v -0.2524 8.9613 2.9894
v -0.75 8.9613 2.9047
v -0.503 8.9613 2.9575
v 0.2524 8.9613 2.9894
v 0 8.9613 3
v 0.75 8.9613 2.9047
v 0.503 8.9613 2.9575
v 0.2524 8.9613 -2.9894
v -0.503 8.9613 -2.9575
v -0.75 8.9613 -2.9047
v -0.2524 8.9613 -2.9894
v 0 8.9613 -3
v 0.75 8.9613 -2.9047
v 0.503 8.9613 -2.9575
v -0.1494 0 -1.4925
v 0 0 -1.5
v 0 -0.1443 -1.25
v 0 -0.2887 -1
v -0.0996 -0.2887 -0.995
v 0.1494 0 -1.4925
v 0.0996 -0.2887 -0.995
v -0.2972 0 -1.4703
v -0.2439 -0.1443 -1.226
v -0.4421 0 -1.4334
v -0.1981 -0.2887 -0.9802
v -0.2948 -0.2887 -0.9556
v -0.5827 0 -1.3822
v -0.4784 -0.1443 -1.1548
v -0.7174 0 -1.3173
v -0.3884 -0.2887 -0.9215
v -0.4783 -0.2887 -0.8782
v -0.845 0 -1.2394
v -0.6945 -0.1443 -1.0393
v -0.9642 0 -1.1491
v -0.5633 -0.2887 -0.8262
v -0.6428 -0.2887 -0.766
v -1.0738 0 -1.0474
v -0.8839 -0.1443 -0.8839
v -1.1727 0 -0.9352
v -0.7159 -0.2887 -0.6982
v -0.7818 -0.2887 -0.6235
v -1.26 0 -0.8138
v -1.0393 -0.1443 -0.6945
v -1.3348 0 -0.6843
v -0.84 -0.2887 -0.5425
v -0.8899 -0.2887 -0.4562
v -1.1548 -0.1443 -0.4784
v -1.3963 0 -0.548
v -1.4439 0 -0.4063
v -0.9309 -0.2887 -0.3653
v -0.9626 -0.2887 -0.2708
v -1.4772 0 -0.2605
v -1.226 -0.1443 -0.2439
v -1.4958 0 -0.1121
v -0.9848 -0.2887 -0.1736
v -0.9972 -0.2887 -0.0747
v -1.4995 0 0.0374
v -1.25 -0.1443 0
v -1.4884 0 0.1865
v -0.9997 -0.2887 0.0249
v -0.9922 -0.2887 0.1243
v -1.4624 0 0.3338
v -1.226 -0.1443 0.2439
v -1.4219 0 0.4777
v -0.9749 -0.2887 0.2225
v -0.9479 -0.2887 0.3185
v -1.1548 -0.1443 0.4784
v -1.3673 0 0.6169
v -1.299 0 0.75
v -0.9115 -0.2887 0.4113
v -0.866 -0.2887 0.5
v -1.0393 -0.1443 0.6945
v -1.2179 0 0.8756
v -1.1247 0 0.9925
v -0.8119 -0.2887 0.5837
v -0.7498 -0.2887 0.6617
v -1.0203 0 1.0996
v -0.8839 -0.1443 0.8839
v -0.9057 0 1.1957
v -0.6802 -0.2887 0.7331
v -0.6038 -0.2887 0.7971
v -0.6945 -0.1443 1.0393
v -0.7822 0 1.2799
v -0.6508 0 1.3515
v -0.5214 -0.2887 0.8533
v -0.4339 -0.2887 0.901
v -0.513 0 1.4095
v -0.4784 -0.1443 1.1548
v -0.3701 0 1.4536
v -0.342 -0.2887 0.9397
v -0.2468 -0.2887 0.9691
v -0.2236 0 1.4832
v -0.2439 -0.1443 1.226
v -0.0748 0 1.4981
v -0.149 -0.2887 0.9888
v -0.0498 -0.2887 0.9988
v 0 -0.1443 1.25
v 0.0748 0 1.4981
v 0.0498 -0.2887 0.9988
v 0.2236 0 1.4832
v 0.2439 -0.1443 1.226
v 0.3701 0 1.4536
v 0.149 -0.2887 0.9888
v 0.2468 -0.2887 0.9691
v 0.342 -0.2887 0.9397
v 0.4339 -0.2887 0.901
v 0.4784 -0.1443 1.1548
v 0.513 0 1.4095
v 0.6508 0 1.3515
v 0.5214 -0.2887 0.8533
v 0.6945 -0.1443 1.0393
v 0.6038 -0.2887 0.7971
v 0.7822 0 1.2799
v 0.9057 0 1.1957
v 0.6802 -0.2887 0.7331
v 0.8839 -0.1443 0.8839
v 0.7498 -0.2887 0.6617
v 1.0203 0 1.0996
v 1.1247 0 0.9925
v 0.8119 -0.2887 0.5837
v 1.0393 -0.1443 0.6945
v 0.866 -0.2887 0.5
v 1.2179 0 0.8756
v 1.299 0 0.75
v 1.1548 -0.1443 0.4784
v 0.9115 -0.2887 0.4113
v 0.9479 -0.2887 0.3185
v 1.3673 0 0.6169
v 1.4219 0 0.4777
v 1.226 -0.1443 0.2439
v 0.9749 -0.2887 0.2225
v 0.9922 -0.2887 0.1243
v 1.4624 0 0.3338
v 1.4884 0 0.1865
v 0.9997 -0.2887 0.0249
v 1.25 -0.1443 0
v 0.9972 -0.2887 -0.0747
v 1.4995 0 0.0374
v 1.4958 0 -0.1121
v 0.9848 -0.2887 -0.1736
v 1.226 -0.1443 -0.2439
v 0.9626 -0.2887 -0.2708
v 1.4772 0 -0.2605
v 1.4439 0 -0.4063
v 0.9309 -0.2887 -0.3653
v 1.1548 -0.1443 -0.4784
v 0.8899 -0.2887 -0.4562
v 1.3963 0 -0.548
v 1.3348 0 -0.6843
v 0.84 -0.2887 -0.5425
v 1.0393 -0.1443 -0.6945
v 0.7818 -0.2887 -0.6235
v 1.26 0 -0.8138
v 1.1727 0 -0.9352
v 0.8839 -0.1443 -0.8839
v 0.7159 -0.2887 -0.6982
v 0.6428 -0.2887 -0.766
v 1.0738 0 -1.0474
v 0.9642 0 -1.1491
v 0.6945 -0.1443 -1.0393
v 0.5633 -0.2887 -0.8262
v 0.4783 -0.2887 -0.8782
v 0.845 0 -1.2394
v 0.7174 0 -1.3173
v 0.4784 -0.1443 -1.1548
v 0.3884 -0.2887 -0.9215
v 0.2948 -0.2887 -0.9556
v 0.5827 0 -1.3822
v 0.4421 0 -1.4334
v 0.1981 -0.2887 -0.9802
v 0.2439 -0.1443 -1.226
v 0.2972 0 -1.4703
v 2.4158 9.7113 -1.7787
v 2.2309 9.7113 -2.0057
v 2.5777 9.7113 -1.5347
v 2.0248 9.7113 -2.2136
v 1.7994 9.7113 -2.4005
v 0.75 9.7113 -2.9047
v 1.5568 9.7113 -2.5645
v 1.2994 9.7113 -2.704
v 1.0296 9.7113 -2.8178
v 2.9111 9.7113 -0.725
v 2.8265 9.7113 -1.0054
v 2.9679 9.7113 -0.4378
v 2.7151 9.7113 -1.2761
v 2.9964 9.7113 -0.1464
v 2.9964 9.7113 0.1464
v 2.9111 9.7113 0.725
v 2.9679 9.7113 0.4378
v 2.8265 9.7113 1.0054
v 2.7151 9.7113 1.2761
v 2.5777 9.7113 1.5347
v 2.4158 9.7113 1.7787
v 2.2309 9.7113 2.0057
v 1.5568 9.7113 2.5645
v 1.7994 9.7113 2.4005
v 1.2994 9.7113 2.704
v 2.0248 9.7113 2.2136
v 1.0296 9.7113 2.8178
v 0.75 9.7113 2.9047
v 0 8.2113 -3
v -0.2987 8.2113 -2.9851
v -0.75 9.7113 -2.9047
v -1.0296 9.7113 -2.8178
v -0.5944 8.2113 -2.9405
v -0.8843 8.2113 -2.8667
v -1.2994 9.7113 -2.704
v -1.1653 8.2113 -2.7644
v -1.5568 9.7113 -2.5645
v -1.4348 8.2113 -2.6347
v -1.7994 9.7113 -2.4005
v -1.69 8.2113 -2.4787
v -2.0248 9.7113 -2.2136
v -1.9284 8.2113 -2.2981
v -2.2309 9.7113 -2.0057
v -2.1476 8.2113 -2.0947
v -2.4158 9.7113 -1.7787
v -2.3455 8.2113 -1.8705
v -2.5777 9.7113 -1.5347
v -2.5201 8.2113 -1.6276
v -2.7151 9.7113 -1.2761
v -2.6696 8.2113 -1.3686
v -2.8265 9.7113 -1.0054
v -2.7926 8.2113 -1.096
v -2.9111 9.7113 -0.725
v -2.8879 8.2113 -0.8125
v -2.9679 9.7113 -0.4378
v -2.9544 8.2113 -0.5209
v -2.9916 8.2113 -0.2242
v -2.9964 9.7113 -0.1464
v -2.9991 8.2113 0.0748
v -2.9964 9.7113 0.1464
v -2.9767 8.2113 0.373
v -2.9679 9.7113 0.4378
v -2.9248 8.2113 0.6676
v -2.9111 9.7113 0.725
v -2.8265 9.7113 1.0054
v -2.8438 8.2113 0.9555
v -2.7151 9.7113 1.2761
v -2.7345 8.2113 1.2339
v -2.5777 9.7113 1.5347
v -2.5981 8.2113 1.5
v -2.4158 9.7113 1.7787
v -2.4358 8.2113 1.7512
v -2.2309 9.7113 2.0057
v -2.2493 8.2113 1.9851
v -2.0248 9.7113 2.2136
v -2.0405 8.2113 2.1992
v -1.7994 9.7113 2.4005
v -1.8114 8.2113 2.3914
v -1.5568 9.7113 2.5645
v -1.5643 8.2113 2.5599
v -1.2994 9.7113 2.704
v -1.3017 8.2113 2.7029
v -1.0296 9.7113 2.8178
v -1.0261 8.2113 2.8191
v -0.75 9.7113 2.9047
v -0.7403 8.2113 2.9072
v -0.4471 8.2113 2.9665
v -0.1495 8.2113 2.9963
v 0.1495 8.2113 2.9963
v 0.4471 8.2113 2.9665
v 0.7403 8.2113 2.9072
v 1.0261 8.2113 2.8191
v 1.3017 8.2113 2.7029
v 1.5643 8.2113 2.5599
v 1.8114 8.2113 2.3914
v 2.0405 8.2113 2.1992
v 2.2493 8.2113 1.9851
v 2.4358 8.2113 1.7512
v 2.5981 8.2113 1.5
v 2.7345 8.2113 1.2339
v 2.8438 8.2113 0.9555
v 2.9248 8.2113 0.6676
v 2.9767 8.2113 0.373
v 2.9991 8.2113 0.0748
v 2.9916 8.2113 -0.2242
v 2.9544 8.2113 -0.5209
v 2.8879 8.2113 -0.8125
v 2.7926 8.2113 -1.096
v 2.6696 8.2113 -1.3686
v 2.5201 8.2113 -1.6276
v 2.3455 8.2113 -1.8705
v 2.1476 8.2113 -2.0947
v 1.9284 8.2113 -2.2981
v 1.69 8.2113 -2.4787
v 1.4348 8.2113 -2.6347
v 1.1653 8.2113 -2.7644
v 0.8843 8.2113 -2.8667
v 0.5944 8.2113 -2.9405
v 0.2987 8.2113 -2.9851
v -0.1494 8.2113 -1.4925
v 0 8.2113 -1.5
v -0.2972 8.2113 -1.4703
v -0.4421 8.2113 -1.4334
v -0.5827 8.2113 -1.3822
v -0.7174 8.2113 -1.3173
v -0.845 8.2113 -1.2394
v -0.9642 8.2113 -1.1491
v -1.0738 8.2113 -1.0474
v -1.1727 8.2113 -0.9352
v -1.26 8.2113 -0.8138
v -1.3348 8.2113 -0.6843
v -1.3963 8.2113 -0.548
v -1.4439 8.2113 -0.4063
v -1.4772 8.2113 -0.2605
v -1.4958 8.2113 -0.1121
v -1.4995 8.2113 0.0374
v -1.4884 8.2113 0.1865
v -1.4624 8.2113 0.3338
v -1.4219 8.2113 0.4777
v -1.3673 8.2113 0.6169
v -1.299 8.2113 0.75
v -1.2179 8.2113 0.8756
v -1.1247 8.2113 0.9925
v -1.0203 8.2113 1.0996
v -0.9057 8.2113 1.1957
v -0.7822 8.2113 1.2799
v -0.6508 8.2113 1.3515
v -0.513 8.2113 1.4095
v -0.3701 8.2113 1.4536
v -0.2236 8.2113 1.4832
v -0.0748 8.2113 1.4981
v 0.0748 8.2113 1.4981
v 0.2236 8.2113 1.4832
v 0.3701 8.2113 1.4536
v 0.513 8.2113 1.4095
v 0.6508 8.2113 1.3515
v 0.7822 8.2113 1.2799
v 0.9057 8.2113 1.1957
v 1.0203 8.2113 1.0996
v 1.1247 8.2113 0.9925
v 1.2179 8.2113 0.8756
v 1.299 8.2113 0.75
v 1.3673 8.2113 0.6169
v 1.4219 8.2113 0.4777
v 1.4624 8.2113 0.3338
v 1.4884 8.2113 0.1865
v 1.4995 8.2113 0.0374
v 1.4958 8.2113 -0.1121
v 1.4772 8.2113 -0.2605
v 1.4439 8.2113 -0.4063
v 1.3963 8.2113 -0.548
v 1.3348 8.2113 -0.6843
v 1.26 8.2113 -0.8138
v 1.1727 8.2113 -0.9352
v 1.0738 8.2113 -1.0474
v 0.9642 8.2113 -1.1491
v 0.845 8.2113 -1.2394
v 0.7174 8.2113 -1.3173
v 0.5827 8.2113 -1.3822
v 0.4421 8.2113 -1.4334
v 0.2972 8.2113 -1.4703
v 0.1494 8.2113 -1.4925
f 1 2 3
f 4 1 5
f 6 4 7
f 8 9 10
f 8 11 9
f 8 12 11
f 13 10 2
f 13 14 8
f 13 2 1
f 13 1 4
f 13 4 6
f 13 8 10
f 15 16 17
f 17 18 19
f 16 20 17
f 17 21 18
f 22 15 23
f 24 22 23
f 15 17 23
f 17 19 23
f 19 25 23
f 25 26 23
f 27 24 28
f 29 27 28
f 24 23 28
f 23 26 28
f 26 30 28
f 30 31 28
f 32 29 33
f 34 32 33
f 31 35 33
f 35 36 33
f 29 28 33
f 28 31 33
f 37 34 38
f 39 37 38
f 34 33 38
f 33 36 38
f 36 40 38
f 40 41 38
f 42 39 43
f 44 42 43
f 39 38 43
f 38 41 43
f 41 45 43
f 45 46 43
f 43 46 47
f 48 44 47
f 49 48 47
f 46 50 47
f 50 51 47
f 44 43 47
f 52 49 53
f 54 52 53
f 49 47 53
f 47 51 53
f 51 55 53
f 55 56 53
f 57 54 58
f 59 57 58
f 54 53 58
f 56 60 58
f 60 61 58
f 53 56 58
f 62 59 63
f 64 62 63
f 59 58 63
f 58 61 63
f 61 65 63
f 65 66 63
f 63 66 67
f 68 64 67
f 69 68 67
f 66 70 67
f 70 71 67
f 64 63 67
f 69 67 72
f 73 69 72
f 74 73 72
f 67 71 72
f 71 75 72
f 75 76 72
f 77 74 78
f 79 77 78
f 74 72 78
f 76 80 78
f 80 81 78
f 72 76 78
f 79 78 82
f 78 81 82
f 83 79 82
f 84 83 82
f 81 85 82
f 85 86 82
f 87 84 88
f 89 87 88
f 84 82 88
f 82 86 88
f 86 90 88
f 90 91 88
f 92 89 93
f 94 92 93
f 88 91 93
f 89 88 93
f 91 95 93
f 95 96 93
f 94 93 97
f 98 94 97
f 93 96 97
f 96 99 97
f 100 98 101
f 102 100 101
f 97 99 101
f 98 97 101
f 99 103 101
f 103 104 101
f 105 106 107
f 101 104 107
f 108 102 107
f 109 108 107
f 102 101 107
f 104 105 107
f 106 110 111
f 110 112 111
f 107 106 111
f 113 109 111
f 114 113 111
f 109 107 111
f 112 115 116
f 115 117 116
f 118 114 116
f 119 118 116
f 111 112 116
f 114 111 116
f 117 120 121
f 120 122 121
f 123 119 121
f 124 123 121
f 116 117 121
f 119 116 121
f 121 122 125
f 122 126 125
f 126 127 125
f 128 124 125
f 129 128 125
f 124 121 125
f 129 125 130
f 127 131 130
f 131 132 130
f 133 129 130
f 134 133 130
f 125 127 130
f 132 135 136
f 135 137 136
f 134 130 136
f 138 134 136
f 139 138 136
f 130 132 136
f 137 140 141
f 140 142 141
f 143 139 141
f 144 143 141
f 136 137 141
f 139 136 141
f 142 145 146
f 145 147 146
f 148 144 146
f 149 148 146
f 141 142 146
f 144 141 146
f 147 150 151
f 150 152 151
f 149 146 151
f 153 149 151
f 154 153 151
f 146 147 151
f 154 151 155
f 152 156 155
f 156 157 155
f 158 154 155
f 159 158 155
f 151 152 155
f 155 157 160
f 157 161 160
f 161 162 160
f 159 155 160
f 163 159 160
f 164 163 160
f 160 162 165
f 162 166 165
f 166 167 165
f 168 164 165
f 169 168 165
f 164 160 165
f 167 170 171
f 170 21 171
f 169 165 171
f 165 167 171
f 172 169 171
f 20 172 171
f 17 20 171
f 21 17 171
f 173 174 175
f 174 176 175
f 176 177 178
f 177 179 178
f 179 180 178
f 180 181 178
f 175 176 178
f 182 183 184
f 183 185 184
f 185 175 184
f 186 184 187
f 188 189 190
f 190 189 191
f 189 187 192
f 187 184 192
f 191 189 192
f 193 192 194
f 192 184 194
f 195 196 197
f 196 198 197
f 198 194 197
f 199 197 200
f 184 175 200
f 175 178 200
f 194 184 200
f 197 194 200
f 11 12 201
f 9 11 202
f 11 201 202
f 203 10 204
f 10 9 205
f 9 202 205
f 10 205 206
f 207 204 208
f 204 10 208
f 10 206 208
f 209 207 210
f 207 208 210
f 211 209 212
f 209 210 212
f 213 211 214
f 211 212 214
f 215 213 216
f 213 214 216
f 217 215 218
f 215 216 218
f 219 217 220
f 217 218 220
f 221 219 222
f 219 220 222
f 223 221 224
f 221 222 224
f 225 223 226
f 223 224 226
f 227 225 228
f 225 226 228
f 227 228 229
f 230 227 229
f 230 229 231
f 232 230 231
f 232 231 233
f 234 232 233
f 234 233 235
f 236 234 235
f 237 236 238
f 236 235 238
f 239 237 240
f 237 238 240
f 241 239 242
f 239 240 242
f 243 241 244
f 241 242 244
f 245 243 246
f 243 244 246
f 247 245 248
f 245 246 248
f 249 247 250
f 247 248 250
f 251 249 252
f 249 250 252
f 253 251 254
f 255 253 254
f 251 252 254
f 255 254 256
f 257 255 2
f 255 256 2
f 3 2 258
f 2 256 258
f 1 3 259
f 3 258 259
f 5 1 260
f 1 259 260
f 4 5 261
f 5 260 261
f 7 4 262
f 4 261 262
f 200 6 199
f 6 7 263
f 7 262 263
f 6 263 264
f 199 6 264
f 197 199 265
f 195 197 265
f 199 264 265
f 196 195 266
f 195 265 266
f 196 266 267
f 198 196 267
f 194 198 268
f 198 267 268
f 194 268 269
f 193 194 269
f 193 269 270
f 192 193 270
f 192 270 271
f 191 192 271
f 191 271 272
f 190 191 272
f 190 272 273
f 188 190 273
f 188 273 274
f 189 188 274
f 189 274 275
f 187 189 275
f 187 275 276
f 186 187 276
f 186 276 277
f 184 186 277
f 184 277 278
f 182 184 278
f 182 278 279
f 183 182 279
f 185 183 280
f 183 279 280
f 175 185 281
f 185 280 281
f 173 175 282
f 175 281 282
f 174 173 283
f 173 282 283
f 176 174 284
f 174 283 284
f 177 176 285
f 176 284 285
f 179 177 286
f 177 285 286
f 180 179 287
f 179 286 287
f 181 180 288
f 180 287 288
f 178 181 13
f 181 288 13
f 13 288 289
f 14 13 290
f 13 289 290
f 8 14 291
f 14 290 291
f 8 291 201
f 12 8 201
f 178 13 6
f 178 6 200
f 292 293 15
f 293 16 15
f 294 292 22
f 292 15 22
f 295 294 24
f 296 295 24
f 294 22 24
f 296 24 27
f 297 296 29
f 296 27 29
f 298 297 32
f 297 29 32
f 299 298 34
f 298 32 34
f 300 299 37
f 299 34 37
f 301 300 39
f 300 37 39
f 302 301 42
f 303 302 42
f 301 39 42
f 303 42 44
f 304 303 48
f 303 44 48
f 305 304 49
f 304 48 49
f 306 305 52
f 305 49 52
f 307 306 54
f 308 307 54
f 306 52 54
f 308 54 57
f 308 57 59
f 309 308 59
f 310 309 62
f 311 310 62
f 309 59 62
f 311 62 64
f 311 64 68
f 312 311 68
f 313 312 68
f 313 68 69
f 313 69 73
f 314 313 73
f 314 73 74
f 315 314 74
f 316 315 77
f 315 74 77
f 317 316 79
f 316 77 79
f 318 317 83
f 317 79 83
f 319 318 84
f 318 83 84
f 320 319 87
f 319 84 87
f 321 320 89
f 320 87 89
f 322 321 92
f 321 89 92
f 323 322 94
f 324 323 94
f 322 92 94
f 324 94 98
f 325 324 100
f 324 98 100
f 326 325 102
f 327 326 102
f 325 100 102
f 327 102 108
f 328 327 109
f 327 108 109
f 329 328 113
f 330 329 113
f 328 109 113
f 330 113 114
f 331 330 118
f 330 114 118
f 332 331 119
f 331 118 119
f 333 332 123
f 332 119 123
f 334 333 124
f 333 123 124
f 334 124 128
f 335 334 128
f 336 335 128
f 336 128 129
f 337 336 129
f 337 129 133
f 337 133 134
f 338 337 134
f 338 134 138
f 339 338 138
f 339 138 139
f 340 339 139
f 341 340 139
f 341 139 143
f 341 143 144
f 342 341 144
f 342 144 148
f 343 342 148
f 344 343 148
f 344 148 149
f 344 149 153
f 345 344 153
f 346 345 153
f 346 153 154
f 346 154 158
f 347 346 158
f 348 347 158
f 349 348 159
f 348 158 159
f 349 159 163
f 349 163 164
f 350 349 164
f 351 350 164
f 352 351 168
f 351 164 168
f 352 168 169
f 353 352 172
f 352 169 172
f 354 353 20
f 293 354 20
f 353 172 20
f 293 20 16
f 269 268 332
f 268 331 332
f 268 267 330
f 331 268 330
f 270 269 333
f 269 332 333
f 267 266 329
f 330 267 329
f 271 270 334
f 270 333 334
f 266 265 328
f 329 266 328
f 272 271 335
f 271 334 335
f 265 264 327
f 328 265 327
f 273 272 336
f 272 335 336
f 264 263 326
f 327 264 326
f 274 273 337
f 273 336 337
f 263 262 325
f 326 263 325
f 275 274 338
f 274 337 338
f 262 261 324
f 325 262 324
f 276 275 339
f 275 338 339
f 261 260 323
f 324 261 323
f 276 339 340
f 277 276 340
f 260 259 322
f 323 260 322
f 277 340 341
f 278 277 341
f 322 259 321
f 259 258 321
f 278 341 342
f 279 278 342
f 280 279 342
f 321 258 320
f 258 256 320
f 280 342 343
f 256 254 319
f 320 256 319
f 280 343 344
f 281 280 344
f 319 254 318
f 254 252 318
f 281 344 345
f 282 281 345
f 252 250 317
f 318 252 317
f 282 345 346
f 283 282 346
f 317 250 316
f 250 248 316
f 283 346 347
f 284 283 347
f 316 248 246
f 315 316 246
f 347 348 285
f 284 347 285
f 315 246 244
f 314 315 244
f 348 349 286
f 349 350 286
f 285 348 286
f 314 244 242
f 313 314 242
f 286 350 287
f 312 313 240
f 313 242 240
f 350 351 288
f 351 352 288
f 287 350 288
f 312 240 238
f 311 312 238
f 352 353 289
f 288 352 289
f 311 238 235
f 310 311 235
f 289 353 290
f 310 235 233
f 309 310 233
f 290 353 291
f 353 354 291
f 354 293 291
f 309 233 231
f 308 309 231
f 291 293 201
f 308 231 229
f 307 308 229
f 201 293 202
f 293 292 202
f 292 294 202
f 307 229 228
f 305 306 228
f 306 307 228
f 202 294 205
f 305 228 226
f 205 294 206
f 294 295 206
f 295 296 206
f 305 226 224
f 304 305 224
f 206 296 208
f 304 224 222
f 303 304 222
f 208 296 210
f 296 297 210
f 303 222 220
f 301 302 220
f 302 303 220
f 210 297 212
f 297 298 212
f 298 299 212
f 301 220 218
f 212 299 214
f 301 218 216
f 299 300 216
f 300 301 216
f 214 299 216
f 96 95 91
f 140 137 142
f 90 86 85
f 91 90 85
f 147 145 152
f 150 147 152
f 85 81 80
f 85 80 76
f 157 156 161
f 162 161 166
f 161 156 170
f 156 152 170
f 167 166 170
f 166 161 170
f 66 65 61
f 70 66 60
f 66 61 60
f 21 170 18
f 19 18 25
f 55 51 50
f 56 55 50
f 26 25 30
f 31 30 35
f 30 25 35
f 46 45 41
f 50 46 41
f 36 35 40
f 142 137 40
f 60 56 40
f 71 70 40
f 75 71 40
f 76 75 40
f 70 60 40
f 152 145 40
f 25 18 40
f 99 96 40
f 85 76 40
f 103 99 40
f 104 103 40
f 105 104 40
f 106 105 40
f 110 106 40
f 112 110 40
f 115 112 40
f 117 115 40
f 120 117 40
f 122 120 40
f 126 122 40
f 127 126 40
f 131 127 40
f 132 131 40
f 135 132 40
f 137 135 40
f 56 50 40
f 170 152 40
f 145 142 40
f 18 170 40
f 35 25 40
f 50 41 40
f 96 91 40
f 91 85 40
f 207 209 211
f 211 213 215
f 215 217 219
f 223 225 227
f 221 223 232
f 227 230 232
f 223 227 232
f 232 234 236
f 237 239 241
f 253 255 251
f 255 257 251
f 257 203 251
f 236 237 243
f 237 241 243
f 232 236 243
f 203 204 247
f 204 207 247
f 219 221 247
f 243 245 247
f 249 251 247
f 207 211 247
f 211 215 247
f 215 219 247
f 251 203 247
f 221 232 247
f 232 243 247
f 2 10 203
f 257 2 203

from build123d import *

# Parameters (mm, degrees)
ENL_V_MAT_EXTRU_1_DEPTH      = 11.597633257
ENL_V_MAT_EXTRU_1_DEPTH_BACK = 11.597633257
ESQUISSE2_W                  = 1.5
ESQUISSE2_H                  = 0.75


with BuildPart() as part:
    # Esquisse1 → Révolution1 (revolve)
    with BuildSketch(Plane.XY, mode=Mode.PRIVATE) as r_volution1_sk:
        Polygon((0, 0), (0, 9.711324865), (3, 9.711324865), (3, 8.211324865), (1.5, 8.211324865), (1.5, 0), (1, -0.288675135), (0, -0.288675135), align=None)
    revolve(r_volution1_sk.sketch.rotate(Axis((0, 0, 0), (0, 1, 0)), 90), axis=Axis((0, 0, 0), (0, 1, 0)))

    # Esquisse2 → Enlèv. mat.-Extru.1 (cut, two sides: drawn at the far end of the back side and taken through both)
    with BuildSketch(Plane.XY.offset(-ENL_V_MAT_EXTRU_1_DEPTH_BACK)):
        with Locations((0, 9.336324865)):
            Rectangle(ESQUISSE2_W, ESQUISSE2_H)
    extrude(amount=ENL_V_MAT_EXTRU_1_DEPTH + ENL_V_MAT_EXTRU_1_DEPTH_BACK, mode=Mode.SUBTRACT)


solid = part.part
